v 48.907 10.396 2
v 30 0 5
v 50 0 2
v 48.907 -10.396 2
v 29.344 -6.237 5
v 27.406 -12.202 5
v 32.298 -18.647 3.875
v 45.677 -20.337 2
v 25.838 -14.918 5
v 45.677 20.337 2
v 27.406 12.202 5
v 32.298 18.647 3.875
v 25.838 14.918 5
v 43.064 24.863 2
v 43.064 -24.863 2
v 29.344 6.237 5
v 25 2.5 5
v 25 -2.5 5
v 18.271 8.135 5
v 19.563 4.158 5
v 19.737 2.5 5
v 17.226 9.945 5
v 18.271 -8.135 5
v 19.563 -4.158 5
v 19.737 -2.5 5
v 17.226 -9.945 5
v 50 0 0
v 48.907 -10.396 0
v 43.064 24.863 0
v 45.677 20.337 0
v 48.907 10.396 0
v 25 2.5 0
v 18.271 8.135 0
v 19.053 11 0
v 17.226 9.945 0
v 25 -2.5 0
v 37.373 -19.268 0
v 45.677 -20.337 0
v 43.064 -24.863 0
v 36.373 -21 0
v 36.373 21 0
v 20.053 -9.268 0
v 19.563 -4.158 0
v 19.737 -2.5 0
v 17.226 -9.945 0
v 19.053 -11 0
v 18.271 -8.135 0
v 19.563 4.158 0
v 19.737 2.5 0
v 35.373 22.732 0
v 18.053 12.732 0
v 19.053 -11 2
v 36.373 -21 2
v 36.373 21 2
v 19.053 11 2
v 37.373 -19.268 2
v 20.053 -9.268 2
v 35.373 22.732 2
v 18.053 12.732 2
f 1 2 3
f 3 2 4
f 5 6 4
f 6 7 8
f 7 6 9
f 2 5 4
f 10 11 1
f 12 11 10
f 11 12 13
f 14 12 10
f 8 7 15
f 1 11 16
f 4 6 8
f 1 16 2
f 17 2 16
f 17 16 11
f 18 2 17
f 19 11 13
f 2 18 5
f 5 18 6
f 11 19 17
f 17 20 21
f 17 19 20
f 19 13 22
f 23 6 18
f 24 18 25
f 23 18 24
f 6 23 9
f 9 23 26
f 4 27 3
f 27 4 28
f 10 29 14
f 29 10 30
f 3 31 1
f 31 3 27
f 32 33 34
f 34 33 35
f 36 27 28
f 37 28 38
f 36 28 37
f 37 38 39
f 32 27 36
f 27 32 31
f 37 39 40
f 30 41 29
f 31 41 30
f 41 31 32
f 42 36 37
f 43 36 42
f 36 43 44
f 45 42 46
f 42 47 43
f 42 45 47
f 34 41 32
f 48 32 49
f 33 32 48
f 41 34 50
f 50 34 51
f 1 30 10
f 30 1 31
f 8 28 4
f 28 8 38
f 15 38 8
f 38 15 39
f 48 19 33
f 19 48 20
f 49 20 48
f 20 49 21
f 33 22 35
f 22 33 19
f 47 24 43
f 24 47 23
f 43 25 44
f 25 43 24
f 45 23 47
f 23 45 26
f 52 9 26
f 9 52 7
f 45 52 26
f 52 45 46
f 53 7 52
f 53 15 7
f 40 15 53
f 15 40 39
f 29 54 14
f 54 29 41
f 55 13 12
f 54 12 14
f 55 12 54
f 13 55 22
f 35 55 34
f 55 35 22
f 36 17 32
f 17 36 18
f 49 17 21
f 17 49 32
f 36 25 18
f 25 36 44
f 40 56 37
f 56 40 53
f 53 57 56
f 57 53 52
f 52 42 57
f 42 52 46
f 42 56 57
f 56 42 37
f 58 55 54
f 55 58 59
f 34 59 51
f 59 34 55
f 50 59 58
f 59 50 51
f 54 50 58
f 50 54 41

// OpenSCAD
// A bird table roof extension in 6 parts
// copyright SJ Hindmarch 2015
// Effort  #1: Getting correct shape
// To do: Get correct dimensions from life
// To do: Sort out interference fit between male and female lug
// Idea: Make the fixing an in and out part for more stability

// The main ring
module ring(){
	difference(){
		union(){
			translate([0,0,2]){
				cylinder(h=3,r1=50,r2=30);
			}
			cylinder(h=2,r=50);
		}
		cylinder(h=5,r=20);
	}
}

// A big slab for removing large portions of the object
module slab(){
	translate([-50,-50,0])cube([50,100,5]);
}

// A tab for connecting pieces
module lug(){
	translate([22,-2,0])cube([20,4,2]);
}

difference(){
	ring();                // The main ring
	// Remove all but a 60 deg sector
	rotate([0,0,60])slab();
	rotate([0,0,-60])slab();
	// Remove space for the notch on the existing roof
	translate([0,-2.5,0])cube([25,5,5]);
	rotate([0,0,-30])lug(); // Space for fixing lug
}

rotate([0,0,30])lug(); // A fixing lug
